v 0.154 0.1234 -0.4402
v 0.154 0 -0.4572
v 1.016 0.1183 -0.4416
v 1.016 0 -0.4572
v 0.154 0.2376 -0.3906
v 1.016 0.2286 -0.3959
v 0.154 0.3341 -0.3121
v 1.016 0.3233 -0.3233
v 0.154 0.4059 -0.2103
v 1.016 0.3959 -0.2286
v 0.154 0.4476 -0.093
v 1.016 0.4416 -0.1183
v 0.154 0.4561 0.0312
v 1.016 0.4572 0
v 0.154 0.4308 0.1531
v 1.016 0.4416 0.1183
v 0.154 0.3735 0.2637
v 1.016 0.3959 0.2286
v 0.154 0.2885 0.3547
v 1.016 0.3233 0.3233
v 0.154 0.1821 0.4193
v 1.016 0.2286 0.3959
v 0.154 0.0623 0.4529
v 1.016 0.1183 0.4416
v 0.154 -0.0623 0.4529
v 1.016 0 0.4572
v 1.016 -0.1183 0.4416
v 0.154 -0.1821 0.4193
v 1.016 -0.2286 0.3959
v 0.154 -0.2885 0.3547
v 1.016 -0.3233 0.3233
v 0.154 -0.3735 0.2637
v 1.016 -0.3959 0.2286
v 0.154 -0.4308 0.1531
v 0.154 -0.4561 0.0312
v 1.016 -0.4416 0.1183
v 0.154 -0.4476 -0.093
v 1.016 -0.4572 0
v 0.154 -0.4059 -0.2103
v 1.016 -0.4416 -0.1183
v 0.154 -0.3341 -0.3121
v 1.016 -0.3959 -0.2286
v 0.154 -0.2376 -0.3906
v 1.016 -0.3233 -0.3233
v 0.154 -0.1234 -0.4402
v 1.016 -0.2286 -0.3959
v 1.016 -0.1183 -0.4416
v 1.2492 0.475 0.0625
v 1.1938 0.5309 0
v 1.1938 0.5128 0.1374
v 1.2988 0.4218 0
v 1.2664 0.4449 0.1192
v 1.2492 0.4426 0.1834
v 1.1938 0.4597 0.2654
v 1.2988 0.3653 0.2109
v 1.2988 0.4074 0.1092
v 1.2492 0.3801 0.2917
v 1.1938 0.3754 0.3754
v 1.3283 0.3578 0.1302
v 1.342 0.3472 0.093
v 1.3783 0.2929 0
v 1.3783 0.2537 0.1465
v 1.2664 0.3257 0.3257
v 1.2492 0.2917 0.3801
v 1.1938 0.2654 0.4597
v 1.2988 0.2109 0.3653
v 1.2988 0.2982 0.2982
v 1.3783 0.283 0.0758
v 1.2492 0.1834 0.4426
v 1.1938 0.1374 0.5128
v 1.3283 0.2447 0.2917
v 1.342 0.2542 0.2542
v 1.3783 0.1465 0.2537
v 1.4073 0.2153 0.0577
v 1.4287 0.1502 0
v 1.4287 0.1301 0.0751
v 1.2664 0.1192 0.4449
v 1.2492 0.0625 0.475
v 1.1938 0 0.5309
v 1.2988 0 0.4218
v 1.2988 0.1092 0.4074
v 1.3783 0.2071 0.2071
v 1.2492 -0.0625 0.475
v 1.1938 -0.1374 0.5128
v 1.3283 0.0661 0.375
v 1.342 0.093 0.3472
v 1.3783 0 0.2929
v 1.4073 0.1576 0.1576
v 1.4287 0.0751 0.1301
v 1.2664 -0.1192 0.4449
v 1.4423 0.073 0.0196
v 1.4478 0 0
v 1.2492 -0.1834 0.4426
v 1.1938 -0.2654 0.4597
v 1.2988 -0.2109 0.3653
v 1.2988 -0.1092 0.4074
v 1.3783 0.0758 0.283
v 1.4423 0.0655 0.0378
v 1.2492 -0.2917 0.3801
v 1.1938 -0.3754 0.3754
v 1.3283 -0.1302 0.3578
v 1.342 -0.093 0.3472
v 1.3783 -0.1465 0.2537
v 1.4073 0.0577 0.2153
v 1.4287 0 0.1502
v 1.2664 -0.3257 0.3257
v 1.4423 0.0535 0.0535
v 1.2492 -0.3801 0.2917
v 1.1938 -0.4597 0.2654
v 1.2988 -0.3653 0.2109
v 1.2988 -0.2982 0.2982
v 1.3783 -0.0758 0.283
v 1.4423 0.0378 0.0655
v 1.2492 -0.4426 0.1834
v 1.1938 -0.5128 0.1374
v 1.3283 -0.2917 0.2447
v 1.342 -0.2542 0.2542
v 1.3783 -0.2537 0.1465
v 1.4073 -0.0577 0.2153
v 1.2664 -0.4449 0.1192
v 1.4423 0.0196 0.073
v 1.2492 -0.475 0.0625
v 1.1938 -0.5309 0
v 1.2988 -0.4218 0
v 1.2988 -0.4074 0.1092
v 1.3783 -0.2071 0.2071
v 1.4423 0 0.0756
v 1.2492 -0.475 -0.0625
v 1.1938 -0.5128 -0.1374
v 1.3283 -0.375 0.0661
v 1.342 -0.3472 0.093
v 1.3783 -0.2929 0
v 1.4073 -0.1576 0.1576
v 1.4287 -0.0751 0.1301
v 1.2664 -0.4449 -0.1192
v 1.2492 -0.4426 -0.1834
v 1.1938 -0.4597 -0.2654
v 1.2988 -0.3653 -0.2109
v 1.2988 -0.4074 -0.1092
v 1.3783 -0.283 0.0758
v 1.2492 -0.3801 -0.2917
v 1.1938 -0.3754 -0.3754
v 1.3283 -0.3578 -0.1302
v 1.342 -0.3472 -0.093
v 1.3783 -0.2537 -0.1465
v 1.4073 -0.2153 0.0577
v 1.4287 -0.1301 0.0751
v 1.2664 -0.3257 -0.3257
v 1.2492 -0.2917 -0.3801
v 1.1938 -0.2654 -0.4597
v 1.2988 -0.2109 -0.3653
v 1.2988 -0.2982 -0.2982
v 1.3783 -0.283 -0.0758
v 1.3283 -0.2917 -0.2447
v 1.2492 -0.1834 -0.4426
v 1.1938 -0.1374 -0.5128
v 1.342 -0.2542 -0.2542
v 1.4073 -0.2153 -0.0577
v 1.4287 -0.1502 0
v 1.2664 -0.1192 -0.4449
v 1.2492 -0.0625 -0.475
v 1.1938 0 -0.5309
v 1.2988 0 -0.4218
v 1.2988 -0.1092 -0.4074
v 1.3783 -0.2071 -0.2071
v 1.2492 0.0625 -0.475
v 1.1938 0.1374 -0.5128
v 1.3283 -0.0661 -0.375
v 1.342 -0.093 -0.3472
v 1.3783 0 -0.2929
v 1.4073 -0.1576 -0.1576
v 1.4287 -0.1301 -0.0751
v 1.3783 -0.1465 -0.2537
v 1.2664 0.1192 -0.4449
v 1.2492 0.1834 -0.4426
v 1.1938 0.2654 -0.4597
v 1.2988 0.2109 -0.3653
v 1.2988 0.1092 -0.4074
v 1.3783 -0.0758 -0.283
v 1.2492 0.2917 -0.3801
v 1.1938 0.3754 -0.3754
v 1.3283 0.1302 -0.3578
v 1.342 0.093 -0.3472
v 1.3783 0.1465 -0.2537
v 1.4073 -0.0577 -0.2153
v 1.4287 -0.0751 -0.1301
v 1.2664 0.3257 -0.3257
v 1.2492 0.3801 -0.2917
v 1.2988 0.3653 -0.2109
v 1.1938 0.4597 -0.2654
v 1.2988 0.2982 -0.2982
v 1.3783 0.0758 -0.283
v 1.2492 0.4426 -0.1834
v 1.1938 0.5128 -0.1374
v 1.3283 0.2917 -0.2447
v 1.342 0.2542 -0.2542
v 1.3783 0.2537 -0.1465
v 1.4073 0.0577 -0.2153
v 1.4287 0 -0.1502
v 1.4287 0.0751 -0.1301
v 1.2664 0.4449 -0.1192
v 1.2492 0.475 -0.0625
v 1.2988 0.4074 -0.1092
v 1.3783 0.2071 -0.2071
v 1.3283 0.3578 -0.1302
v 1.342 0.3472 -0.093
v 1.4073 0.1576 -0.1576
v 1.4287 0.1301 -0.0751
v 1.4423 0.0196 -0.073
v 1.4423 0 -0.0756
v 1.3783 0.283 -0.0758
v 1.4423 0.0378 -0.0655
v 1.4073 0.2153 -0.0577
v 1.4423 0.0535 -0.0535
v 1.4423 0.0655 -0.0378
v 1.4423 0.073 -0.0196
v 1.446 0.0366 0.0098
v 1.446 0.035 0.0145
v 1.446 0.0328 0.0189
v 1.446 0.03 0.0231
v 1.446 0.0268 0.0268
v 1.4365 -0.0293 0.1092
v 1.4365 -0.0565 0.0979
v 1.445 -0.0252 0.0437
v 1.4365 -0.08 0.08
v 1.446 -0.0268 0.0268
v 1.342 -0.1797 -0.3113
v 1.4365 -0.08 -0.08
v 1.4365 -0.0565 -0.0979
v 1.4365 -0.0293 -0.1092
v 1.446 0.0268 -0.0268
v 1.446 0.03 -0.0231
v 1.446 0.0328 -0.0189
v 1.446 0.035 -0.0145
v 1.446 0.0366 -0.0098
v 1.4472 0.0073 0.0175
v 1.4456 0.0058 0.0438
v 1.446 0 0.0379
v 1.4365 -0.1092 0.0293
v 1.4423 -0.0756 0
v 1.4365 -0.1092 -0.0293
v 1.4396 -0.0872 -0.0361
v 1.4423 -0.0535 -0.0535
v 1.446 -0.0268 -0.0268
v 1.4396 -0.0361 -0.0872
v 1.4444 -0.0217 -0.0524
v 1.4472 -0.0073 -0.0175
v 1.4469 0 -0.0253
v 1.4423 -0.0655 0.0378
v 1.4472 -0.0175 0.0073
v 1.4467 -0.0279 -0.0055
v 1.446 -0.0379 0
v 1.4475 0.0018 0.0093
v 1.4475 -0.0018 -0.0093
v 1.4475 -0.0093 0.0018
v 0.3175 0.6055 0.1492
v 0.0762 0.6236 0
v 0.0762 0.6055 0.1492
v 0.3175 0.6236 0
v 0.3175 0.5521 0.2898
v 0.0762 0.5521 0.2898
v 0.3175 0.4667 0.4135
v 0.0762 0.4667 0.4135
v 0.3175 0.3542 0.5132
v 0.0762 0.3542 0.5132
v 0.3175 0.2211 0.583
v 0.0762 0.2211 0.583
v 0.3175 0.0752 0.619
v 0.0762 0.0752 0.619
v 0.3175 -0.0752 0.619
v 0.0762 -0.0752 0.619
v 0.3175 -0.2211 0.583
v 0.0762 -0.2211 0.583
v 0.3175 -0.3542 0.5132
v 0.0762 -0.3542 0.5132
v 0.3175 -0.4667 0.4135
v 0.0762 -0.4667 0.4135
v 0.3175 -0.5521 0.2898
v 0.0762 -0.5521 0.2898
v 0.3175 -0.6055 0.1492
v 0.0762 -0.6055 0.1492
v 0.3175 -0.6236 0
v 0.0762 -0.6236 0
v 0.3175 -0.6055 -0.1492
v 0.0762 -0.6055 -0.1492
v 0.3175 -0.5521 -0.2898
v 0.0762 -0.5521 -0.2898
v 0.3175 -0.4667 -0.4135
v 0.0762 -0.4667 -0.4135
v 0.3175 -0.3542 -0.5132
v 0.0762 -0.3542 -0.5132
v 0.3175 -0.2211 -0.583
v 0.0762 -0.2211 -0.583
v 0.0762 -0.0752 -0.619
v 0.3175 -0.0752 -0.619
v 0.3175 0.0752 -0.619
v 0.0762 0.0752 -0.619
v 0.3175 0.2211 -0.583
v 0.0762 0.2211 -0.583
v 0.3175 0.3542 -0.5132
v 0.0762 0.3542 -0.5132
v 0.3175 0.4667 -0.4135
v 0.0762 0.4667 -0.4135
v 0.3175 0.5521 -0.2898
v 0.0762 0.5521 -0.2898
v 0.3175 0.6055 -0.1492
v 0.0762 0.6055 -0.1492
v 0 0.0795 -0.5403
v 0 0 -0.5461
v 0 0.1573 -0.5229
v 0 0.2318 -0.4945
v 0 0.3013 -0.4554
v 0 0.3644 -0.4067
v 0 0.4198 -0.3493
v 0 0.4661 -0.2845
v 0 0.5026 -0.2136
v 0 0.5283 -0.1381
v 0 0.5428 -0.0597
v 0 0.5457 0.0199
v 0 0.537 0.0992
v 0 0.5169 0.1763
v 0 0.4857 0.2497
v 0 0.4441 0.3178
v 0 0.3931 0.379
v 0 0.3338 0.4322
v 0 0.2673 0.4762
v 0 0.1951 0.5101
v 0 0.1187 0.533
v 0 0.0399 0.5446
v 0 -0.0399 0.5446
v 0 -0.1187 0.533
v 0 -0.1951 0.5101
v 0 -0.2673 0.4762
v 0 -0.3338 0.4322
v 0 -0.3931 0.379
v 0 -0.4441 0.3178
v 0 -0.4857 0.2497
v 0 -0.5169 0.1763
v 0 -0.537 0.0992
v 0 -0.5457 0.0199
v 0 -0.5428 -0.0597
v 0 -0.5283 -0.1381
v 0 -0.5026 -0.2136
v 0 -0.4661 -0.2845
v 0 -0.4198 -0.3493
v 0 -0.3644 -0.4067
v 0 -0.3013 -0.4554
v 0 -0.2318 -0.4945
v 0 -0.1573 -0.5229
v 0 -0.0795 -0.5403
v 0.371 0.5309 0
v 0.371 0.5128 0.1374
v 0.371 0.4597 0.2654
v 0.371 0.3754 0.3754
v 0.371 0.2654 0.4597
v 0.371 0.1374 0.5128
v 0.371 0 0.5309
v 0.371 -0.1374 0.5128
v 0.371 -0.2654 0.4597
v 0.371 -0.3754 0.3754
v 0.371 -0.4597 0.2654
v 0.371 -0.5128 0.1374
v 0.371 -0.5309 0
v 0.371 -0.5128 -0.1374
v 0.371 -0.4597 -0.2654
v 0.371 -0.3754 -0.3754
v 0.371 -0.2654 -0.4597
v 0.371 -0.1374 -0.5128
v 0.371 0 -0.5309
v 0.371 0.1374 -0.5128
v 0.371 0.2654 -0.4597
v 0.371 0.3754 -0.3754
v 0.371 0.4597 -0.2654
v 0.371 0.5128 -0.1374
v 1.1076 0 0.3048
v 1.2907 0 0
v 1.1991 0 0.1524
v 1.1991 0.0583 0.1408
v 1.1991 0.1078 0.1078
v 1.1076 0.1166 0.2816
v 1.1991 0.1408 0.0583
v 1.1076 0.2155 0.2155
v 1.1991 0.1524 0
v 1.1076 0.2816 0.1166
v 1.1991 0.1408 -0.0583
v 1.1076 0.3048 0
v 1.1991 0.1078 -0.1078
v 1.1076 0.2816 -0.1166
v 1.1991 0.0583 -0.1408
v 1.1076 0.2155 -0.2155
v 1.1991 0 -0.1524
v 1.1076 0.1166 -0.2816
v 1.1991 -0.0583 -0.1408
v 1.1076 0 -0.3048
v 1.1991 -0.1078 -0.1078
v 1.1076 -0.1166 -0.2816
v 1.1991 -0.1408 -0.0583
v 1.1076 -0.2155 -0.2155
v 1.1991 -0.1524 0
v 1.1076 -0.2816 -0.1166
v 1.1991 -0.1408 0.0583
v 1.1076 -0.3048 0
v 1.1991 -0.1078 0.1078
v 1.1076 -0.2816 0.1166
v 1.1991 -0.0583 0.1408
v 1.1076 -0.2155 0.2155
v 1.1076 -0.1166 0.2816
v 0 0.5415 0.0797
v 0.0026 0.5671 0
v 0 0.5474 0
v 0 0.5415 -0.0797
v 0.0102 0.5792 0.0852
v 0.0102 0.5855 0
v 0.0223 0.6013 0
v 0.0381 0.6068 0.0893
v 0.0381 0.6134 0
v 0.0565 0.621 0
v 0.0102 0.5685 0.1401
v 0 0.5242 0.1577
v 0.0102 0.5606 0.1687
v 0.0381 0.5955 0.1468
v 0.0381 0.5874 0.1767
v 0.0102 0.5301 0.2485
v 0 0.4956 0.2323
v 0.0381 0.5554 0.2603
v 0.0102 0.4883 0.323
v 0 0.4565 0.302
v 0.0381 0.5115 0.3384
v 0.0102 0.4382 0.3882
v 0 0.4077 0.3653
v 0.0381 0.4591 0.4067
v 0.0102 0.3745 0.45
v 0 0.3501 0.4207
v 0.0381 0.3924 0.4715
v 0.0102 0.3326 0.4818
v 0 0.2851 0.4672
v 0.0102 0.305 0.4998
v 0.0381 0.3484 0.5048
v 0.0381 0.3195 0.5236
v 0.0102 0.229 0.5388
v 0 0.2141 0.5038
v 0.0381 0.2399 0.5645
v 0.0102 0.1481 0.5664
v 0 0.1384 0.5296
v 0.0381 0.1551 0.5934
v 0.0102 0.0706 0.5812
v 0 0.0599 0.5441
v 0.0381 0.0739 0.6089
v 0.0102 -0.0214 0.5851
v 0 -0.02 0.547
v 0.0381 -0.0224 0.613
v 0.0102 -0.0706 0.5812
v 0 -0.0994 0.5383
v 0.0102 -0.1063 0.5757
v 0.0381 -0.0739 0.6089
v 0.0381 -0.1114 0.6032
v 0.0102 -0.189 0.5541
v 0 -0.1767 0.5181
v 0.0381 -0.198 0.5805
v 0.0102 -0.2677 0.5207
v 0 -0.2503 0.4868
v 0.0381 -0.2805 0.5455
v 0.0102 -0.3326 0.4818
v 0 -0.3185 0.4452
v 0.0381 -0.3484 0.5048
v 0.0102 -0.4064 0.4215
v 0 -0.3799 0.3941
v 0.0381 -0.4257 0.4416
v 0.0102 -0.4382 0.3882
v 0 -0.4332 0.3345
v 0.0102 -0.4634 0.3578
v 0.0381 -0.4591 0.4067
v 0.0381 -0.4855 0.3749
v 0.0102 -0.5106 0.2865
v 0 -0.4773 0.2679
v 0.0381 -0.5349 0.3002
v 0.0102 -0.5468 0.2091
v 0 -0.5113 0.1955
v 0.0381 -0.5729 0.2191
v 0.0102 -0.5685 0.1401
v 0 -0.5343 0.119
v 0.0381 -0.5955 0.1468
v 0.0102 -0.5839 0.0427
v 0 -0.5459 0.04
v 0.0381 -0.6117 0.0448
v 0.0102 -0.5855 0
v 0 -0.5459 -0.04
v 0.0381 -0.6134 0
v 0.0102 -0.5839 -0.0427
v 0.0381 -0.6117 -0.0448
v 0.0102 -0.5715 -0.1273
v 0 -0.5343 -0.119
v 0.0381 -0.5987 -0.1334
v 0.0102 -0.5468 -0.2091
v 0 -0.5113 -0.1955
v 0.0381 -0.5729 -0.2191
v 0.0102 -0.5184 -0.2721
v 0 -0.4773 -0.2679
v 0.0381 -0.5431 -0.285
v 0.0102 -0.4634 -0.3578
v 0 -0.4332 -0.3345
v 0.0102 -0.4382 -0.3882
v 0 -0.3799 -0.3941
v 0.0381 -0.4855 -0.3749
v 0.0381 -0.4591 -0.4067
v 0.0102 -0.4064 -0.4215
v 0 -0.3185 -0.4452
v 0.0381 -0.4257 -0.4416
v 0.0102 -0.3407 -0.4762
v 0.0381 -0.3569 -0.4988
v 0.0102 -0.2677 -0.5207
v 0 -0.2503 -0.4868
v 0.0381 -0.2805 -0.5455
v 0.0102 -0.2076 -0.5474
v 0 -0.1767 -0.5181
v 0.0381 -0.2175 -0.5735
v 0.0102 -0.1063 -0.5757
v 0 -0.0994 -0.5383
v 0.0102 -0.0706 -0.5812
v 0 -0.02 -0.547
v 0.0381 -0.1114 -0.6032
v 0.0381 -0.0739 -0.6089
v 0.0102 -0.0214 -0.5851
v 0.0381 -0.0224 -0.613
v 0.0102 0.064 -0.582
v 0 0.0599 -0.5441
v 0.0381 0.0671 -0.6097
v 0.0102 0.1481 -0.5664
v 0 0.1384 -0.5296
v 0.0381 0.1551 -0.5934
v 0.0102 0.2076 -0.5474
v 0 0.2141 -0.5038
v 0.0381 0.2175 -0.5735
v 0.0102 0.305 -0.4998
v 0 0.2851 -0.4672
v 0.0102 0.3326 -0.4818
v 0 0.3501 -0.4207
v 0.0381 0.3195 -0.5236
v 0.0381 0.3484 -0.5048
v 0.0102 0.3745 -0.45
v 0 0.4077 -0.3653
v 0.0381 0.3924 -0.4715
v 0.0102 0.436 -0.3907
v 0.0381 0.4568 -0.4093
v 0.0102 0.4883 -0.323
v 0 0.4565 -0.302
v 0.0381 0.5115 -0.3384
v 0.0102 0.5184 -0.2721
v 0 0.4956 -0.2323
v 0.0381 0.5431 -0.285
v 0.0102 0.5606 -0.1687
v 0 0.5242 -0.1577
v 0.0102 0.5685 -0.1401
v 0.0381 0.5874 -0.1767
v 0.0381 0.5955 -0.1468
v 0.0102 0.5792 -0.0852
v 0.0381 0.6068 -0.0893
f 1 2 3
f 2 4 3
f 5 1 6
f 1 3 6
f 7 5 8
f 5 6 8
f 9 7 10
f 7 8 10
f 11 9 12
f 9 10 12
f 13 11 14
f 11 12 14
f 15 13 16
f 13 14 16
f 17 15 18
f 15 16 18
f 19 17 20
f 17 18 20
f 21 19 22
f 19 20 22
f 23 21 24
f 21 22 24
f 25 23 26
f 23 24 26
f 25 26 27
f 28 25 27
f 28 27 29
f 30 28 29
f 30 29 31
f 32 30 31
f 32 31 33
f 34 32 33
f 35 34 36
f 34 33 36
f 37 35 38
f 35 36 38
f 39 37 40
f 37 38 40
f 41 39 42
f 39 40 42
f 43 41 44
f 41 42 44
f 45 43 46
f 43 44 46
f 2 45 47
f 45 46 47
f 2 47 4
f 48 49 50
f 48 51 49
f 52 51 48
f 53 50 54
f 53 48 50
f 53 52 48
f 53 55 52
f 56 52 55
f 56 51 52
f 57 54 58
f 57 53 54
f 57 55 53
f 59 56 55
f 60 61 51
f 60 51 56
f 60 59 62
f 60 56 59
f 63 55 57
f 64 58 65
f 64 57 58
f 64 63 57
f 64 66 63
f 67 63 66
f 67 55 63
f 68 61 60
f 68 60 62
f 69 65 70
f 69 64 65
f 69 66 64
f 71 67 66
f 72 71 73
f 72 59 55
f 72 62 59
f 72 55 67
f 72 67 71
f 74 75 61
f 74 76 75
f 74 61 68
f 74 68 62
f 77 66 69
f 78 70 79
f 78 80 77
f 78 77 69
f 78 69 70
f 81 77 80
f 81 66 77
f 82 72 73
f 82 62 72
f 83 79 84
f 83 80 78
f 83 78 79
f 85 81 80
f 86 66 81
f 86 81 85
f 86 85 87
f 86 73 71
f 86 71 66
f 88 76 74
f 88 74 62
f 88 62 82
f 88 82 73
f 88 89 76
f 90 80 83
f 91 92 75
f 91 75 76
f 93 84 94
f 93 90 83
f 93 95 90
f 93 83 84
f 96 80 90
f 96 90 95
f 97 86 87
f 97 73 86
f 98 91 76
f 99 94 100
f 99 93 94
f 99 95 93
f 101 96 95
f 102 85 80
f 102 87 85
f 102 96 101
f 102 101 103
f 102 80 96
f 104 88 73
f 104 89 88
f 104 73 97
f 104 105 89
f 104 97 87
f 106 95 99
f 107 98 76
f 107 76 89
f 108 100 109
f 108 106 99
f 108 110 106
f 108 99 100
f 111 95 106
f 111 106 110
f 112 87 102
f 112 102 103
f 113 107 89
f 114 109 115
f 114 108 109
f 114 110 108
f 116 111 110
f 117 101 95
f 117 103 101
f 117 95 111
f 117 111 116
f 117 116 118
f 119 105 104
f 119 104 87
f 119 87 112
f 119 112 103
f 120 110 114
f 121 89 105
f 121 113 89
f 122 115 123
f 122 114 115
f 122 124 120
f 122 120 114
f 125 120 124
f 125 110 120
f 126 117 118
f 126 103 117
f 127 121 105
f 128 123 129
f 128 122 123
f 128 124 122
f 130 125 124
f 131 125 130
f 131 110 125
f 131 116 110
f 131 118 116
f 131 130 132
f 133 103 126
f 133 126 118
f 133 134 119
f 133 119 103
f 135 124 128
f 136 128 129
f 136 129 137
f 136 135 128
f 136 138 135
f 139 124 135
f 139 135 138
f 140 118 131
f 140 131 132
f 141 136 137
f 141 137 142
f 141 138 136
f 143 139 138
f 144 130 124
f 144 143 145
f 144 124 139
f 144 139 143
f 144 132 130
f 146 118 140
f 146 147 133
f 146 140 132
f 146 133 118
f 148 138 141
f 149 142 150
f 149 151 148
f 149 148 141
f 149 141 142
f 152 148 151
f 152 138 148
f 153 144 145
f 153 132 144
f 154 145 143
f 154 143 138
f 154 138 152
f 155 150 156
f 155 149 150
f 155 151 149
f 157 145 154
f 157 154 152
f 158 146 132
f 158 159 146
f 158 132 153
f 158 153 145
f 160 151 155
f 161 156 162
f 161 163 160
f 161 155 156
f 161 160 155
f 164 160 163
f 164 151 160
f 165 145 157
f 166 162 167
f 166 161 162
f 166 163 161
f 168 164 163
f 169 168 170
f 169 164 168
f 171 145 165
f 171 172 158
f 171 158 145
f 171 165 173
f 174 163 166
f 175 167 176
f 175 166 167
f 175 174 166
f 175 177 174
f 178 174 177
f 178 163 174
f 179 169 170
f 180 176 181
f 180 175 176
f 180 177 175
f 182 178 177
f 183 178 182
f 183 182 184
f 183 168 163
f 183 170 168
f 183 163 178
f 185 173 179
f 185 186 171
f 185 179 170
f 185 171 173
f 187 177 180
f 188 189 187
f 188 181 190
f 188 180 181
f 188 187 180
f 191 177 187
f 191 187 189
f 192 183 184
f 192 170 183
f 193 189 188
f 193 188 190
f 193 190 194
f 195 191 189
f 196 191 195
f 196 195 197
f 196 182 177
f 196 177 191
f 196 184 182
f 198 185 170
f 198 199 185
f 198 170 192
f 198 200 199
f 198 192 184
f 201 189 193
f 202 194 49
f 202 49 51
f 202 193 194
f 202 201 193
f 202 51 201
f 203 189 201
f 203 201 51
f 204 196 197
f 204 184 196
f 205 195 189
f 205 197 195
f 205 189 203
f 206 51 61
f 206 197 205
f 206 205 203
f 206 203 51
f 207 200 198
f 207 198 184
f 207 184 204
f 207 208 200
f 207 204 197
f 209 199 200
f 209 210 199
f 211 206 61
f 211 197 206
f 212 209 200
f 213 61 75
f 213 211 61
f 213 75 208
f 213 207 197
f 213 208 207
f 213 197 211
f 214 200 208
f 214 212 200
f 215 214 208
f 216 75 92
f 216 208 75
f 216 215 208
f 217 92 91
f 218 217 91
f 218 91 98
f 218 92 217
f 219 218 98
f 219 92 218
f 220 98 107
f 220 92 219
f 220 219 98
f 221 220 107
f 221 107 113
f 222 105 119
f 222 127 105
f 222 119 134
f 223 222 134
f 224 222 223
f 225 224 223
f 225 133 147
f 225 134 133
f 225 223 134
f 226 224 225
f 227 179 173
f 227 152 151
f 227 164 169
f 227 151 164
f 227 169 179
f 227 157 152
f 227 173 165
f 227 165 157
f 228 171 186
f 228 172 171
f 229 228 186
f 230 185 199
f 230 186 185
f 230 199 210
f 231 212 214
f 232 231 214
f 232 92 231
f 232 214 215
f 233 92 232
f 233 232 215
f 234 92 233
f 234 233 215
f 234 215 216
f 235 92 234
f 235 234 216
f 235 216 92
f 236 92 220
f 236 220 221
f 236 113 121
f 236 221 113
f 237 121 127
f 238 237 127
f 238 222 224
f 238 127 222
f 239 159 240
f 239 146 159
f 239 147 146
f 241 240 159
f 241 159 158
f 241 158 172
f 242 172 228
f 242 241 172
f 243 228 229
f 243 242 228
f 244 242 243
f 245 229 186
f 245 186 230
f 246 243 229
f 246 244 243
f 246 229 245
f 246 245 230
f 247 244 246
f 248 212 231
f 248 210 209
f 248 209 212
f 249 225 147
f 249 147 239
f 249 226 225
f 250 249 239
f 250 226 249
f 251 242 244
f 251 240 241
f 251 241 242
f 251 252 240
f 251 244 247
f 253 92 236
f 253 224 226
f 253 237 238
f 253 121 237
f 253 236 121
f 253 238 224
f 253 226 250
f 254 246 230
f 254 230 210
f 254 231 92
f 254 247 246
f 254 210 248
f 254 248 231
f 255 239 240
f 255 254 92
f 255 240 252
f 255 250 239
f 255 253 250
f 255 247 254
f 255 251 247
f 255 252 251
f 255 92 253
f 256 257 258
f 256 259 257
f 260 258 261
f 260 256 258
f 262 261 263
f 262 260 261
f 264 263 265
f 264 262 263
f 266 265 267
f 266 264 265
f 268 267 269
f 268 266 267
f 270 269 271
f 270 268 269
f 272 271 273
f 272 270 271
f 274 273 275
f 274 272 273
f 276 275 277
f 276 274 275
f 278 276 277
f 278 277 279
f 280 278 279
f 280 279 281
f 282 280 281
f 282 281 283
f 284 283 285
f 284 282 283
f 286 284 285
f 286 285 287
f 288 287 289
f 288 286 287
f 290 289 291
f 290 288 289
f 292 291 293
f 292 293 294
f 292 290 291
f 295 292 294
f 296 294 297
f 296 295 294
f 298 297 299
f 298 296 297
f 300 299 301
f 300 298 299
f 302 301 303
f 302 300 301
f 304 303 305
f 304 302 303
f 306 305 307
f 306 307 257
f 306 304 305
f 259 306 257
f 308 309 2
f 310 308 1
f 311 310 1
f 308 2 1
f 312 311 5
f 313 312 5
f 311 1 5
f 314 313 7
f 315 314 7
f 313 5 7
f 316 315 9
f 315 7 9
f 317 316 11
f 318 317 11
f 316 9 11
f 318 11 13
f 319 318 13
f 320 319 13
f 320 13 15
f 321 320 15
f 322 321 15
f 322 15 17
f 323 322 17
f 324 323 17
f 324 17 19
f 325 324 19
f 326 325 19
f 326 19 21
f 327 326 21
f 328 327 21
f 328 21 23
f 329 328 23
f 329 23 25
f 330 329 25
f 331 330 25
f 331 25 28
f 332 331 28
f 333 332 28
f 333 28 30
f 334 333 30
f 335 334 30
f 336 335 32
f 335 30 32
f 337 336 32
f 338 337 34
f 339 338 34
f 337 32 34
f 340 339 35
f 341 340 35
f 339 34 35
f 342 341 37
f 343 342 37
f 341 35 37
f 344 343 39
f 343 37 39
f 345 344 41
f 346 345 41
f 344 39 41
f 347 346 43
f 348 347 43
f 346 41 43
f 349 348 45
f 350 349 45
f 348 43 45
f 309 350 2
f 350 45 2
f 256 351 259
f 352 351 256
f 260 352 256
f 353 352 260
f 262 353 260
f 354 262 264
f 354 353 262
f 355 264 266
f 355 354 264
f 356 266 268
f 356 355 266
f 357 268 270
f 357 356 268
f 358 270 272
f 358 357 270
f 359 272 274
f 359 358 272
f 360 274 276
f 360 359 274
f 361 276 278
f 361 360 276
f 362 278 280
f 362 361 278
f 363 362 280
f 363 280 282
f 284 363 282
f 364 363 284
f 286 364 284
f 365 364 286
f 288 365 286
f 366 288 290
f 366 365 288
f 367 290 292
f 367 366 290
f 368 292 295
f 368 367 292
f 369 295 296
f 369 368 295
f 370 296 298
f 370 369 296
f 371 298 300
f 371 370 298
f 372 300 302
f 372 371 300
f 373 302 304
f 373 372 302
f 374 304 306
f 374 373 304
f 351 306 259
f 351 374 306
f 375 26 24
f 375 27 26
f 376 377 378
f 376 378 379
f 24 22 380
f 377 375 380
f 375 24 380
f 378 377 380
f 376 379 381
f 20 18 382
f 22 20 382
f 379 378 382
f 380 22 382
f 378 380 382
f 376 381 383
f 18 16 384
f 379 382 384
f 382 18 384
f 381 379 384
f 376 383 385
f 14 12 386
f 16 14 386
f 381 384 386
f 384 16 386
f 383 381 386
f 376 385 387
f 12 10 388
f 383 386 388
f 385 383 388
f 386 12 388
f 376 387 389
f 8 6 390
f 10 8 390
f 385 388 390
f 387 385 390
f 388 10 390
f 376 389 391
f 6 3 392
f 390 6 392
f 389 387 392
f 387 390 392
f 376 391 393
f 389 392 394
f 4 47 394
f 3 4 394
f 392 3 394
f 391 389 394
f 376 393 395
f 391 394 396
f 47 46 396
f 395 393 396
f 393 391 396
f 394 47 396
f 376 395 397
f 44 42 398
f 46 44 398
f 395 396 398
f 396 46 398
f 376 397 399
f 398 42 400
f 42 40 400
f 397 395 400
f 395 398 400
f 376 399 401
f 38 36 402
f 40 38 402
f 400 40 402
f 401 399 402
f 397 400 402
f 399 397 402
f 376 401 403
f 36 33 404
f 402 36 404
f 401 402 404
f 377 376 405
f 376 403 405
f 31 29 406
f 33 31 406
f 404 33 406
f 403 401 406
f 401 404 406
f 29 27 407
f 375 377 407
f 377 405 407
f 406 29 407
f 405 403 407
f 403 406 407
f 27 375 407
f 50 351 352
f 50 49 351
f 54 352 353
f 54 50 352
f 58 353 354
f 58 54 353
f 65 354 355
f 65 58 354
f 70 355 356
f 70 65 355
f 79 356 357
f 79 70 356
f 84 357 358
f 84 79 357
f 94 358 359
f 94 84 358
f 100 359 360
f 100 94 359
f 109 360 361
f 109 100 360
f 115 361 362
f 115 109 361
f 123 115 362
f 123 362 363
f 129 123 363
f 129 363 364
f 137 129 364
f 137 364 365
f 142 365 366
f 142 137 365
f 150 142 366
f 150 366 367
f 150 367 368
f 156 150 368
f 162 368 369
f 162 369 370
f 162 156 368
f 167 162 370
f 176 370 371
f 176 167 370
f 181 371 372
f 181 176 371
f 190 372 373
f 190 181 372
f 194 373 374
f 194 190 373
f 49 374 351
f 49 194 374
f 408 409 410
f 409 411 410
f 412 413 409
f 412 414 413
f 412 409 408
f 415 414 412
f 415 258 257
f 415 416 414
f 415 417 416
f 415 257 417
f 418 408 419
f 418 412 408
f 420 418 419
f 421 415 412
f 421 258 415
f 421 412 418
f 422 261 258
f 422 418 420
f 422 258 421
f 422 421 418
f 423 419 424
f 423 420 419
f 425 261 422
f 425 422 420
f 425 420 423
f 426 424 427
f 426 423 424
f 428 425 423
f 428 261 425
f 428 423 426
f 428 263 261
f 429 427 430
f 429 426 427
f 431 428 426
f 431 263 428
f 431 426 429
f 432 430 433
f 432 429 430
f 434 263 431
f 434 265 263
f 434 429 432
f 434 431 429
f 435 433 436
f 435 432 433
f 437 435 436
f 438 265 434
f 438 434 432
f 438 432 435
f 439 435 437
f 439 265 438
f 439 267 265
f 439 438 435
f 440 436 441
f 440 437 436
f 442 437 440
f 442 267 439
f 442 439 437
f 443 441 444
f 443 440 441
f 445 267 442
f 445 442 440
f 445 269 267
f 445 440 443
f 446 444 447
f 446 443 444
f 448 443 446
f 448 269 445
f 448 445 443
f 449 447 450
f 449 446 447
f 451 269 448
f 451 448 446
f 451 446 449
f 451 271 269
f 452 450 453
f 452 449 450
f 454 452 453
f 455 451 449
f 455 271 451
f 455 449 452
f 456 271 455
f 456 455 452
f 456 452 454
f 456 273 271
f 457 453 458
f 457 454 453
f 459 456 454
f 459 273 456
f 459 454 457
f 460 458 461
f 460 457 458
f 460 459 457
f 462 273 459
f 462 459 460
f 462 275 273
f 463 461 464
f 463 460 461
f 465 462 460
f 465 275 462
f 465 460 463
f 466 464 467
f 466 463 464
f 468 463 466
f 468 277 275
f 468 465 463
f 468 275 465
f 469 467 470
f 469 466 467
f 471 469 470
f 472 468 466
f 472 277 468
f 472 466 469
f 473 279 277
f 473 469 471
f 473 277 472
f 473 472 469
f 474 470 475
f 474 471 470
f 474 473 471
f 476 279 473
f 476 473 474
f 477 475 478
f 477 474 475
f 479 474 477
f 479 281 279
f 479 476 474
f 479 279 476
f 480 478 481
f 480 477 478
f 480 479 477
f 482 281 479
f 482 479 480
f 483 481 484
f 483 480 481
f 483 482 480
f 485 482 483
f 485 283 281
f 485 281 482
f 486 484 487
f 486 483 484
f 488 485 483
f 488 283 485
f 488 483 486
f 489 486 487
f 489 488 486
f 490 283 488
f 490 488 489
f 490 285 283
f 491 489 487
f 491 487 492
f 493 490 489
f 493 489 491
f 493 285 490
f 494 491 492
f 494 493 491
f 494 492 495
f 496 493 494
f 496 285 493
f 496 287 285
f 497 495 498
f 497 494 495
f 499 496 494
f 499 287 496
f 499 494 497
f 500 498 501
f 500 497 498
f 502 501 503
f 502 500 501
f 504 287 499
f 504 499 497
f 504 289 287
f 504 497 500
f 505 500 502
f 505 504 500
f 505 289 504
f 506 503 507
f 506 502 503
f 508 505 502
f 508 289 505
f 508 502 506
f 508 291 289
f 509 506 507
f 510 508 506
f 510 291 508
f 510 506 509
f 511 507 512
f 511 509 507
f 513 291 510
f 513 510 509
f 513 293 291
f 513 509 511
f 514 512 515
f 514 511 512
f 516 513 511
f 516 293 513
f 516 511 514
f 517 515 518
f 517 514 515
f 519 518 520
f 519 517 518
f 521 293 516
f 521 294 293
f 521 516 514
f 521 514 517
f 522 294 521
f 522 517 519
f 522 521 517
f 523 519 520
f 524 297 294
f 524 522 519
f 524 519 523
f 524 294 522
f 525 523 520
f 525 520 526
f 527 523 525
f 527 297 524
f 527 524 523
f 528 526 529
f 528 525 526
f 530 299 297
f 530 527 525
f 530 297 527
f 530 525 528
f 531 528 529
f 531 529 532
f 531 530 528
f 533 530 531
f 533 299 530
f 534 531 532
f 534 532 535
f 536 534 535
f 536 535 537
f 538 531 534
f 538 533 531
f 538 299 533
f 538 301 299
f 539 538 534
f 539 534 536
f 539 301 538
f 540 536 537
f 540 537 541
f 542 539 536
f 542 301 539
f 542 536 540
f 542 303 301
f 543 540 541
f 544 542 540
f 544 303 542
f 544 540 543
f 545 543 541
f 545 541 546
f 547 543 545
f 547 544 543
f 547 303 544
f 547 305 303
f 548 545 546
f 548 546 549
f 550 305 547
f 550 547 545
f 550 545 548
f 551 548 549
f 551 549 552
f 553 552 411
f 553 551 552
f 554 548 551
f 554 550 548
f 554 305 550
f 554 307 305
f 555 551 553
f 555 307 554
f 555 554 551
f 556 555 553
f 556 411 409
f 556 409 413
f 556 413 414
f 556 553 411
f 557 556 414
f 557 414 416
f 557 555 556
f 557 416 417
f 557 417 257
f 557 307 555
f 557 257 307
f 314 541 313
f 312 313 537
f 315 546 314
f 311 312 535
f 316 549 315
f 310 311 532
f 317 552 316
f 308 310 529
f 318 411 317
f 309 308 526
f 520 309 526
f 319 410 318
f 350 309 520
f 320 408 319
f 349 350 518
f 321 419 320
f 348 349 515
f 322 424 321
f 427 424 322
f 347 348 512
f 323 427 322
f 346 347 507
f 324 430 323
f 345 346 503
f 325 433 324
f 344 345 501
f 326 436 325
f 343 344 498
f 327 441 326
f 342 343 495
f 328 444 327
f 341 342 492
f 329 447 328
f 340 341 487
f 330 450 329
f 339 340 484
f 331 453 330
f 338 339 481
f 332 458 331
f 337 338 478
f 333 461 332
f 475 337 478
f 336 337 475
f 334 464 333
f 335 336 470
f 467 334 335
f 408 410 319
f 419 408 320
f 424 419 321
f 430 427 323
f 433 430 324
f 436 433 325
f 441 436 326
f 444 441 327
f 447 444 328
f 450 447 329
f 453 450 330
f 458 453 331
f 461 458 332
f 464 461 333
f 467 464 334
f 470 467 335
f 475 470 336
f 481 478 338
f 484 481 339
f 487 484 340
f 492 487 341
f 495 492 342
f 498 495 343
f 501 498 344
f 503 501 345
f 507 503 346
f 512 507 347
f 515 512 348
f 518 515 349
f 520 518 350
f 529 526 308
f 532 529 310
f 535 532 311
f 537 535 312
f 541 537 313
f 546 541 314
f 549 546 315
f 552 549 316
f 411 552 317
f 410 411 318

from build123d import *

# Parameters (mm, degrees)
HOLE1_D           = 0.9144
HOLE1_DEPTH       = 1.016
HOLE1_CSINK_D     = 1.0922
HOLE1_CSINK_ANGLE = 60
HOLE1_TIP         = 0.274713475


with BuildPart() as part:
    # Sketch1 → RevolutionAngle1 (revolve)
    with BuildSketch(Plane.XY):
        with BuildLine():
            Line((0, 0), (0, 0.54737))
            ThreePointArc((0, 0.54737), (0.022318463, 0.601251537), (0.0762, 0.62357))
            Line((0.0762, 0.62357), (0.3175, 0.62357))
            Line((0.3175, 0.62357), (0.371026143, 0.53086))
            Line((0.371026143, 0.53086), (1.1938, 0.53086))
            ThreePointArc((1.1938, 0.53086), (1.37828421, 0.292934407), (1.4478, 0))
            Line((1.4478, 0), (0, 0))
        make_face()
    revolve(axis=Axis((0, 0, 0), (1, 0, 0)))

    # Hole1
    with Locations(Plane.ZY):
        with Locations((0, 0)):
            CounterSinkHole(HOLE1_D / 2, HOLE1_CSINK_D / 2, depth=HOLE1_DEPTH, counter_sink_angle=HOLE1_CSINK_ANGLE)
            with Locations((0, 0, -(HOLE1_DEPTH + HOLE1_TIP / 2))):  # 118° drill point
                Cone(0, HOLE1_D / 2, HOLE1_TIP, mode=Mode.SUBTRACT)


solid = part.part
